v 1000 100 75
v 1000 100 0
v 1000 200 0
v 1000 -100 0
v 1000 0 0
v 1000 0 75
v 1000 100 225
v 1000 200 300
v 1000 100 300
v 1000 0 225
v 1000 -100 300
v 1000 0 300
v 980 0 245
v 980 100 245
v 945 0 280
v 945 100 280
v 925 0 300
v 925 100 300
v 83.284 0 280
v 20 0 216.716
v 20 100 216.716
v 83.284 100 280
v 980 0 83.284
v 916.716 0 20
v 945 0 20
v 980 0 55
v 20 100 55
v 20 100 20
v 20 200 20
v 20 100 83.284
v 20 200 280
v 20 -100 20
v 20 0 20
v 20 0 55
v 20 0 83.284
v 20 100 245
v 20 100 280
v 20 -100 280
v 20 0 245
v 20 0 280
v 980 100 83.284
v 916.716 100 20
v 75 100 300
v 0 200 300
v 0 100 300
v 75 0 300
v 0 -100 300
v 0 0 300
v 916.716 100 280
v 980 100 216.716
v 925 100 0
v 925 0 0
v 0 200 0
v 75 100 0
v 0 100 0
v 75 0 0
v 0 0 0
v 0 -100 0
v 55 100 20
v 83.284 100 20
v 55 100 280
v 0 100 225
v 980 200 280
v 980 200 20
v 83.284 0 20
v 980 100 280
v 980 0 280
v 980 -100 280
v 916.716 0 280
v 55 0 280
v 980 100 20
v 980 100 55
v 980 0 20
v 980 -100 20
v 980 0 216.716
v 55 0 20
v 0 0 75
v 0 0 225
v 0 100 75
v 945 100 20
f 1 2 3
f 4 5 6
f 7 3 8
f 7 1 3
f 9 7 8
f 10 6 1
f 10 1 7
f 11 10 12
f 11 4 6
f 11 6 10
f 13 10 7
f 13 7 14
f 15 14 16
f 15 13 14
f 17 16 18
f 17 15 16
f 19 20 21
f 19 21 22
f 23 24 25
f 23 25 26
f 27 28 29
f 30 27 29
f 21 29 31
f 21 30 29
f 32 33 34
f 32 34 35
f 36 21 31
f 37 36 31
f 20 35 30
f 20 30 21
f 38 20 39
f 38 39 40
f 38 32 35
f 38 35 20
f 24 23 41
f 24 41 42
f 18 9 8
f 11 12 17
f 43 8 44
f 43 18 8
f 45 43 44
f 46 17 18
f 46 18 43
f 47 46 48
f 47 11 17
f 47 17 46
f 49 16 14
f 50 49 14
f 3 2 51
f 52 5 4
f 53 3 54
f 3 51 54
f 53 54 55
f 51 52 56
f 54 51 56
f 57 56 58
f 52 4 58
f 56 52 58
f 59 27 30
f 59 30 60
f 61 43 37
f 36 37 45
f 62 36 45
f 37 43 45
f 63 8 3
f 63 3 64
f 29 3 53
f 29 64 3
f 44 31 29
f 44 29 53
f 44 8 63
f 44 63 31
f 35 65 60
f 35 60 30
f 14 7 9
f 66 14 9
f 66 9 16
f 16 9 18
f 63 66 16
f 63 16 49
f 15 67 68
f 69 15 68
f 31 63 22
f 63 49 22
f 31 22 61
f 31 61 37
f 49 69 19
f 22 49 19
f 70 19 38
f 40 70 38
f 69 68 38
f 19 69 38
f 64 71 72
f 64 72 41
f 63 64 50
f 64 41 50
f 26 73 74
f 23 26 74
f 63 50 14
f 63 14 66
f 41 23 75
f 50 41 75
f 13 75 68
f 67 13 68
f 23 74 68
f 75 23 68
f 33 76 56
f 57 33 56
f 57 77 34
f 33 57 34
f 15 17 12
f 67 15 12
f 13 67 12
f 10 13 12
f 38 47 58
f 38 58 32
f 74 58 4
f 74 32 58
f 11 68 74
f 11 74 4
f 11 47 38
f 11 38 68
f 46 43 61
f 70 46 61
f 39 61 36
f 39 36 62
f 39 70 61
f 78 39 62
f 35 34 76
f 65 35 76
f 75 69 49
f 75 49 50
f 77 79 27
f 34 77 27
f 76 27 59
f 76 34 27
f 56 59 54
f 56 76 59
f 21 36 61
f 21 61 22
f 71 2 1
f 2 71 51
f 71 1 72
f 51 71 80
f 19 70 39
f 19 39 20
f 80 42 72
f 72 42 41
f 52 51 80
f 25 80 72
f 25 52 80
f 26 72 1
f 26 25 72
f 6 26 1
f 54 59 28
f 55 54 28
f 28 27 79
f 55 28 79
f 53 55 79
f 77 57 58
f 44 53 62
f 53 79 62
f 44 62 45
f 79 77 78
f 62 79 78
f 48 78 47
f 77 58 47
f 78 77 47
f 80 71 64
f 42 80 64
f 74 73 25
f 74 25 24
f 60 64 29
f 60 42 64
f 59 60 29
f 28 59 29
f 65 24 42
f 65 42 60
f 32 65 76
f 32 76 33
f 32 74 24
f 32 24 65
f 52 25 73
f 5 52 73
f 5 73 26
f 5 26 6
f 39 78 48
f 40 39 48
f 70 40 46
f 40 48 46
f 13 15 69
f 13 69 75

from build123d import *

# Parameters (mm, degrees)
F0_W     = 1000
F0_H     = 300
F0_W_2   = 960
F0_H_2   = 260
F1_DEPTH = 100
F3_DEPTH = 100
F4_W     = 1000
F4_H     = 300
F4_W_2   = 960
F4_H_2   = 260
F5_DEPTH = 100


with BuildPart() as f1:
    # F0 (on Front) → F1 (new body)
    with BuildSketch(Plane.XZ):
        with Locations((500, 150)):
            Rectangle(F0_W, F0_H)
        with Locations((500, 150)):
            Rectangle(F0_W_2, F0_H_2, mode=Mode.SUBTRACT)
    extrude(amount=F1_DEPTH)

    # F2 (on Front) → F3 (join)
    with BuildSketch(Plane.XZ):
        Polygon((0, 225), (0, 75), (75, 0), (925, 0), (1000, 75), (1000, 225), (925, 300), (75, 300), align=None)
        Polygon((20, 83.284271), (20, 216.715729), (83.284271, 280), (916.715729, 280), (980, 216.715729), (980, 83.284271), (916.715729, 20), (83.284271, 20), align=None, mode=Mode.SUBTRACT)
    extrude(amount=-F3_DEPTH)

    # F4 (on face) → F5 (join)
    with BuildSketch(Plane(origin=(0, 100, 0), x_dir=(-1, 0, 0), z_dir=(0, 1, 0))):
        with Locations((-500, 150)):
            Rectangle(F4_W, F4_H)
        with Locations((-500, 150)):
            Rectangle(F4_W_2, F4_H_2, mode=Mode.SUBTRACT)
    extrude(amount=F5_DEPTH)


solid = f1.part
